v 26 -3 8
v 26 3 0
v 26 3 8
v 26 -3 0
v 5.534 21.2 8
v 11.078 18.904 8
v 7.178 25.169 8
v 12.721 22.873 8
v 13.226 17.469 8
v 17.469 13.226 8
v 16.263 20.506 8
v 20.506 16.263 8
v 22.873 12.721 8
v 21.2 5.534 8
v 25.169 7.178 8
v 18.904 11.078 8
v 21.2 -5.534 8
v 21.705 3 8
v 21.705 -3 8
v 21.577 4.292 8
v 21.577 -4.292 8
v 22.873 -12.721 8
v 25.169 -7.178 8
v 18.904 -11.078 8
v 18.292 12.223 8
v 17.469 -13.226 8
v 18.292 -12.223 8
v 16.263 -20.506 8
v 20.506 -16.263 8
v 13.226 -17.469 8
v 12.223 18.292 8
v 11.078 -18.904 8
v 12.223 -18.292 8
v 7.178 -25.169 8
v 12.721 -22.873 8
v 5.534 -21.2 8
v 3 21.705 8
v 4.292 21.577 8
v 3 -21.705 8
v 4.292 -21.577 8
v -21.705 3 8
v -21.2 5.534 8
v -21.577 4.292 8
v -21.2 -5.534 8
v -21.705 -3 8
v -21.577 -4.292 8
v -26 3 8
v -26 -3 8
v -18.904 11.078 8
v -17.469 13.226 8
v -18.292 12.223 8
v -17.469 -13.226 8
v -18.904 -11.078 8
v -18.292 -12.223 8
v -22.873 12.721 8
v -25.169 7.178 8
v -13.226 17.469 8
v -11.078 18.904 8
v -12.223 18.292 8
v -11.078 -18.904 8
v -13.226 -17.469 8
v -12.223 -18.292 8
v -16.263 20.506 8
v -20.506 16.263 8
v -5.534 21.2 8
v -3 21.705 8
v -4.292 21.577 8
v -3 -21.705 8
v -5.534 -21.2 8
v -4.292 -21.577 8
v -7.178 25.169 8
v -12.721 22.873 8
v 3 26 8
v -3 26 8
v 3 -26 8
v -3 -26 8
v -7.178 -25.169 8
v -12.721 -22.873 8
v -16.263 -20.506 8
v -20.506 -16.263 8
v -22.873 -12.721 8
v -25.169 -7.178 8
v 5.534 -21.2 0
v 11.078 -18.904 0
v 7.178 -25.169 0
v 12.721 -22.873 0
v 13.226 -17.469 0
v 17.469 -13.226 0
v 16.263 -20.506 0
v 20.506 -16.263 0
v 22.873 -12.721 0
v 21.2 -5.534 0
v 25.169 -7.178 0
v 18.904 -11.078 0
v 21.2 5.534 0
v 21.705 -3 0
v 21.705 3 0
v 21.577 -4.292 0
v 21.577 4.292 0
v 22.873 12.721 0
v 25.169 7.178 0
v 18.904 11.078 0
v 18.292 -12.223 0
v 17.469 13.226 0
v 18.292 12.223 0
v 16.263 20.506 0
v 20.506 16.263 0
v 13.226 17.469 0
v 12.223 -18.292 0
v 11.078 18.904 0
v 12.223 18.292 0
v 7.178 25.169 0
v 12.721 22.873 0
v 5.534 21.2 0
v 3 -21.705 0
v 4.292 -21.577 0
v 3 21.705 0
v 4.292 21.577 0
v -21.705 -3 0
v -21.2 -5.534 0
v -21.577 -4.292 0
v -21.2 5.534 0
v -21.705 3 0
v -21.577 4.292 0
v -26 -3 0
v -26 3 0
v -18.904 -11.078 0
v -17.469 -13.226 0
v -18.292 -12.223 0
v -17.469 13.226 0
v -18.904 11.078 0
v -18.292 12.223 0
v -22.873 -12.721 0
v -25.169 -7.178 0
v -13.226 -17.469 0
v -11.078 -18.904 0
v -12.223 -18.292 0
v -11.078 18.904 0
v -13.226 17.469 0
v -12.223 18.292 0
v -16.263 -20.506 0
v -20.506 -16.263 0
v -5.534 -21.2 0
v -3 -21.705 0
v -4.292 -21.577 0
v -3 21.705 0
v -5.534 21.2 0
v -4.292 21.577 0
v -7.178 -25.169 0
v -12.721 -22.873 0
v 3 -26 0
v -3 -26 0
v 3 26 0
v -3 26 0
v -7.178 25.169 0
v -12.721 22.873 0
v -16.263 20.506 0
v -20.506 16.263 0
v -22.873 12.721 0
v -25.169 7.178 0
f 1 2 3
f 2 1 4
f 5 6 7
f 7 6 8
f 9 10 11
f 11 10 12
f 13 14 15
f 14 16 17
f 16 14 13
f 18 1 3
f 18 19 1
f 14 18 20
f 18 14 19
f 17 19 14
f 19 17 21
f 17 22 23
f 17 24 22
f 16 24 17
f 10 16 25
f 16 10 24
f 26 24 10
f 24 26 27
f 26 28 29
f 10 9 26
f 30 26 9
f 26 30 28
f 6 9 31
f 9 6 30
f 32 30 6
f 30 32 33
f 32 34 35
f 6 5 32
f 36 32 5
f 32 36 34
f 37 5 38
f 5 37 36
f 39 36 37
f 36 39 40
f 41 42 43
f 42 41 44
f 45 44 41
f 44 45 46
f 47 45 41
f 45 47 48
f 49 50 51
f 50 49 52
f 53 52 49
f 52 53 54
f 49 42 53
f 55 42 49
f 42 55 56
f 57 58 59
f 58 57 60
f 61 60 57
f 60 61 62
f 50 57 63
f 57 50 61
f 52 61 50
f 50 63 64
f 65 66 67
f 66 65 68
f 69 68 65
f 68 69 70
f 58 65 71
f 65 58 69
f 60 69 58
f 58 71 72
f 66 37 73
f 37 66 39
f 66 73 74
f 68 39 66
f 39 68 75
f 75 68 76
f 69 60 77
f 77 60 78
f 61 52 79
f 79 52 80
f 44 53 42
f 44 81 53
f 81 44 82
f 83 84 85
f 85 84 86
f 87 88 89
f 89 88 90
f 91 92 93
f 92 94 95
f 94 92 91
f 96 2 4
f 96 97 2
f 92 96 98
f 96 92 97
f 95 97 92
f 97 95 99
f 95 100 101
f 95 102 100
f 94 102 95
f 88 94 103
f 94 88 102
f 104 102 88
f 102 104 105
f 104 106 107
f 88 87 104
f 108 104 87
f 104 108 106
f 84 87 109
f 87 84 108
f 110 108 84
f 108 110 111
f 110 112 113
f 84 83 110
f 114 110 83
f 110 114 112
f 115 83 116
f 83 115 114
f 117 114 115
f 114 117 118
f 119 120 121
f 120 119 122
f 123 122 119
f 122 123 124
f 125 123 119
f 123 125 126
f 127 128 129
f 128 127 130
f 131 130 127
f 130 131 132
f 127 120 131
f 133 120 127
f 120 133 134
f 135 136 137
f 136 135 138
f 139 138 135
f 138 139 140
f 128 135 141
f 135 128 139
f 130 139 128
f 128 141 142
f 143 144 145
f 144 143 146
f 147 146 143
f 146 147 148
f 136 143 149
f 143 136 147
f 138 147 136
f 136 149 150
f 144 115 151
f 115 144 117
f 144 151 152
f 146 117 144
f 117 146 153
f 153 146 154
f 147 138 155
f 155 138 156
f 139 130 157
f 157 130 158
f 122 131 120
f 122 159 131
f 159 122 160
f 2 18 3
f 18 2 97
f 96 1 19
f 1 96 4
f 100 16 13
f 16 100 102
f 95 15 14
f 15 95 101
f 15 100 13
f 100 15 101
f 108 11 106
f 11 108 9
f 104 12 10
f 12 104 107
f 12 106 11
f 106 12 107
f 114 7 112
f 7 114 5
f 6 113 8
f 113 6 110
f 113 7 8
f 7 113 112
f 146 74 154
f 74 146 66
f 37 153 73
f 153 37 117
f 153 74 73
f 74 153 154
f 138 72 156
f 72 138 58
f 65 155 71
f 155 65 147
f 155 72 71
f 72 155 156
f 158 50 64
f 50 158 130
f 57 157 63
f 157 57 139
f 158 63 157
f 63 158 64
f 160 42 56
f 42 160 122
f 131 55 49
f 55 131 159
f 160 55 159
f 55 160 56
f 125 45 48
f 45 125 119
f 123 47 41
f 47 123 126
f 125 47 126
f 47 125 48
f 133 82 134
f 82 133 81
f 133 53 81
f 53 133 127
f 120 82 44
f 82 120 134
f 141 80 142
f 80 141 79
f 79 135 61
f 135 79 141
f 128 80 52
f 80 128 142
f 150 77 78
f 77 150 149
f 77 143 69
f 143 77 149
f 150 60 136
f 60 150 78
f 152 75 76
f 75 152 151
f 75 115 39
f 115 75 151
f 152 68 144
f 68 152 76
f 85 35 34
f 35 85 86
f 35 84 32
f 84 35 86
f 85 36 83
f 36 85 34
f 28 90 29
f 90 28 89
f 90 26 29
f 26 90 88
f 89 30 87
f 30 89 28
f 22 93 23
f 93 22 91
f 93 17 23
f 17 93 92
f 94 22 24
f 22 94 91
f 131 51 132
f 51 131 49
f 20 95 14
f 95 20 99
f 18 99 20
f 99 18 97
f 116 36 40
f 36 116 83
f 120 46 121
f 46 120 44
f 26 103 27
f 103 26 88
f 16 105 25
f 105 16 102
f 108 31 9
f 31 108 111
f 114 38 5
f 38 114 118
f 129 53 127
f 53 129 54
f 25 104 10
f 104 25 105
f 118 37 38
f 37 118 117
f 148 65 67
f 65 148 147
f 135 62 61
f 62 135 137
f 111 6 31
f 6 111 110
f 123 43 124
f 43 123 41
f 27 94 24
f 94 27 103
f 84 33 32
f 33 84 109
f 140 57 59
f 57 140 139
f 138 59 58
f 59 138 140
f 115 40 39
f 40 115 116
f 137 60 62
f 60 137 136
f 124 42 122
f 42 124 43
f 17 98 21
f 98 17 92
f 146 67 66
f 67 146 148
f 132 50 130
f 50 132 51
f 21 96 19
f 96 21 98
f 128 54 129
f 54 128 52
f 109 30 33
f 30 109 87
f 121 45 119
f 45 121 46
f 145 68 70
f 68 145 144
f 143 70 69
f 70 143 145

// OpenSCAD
$fn = 32;

// ----------------------------------------------------------------------
// Spur blank: plain gear blank
// ----------------------------------------------------------------------

// --- parameters (mm) ---
disc_r = 22;              // blank root radius
disc_t = 8;               // blank thickness
n_teeth = 16;             // stub tooth count
tooth_w = 6;              // tooth width at the root
tooth_h = 4;              // tooth height above the root

out_r = disc_r + tooth_h;  // tip radius
bbox_x = 52.0;  // measured width over the teeth
bbox_y = 52.0;  // measured depth over the teeth

union() {
  cylinder(r = disc_r, h = disc_t);
  for (i = [0 : n_teeth - 1])
    rotate([0, 0, i * 360 / n_teeth])
      translate([disc_r - 1, -tooth_w / 2, 0])
        cube([tooth_h + 1, tooth_w, disc_t]);
}
